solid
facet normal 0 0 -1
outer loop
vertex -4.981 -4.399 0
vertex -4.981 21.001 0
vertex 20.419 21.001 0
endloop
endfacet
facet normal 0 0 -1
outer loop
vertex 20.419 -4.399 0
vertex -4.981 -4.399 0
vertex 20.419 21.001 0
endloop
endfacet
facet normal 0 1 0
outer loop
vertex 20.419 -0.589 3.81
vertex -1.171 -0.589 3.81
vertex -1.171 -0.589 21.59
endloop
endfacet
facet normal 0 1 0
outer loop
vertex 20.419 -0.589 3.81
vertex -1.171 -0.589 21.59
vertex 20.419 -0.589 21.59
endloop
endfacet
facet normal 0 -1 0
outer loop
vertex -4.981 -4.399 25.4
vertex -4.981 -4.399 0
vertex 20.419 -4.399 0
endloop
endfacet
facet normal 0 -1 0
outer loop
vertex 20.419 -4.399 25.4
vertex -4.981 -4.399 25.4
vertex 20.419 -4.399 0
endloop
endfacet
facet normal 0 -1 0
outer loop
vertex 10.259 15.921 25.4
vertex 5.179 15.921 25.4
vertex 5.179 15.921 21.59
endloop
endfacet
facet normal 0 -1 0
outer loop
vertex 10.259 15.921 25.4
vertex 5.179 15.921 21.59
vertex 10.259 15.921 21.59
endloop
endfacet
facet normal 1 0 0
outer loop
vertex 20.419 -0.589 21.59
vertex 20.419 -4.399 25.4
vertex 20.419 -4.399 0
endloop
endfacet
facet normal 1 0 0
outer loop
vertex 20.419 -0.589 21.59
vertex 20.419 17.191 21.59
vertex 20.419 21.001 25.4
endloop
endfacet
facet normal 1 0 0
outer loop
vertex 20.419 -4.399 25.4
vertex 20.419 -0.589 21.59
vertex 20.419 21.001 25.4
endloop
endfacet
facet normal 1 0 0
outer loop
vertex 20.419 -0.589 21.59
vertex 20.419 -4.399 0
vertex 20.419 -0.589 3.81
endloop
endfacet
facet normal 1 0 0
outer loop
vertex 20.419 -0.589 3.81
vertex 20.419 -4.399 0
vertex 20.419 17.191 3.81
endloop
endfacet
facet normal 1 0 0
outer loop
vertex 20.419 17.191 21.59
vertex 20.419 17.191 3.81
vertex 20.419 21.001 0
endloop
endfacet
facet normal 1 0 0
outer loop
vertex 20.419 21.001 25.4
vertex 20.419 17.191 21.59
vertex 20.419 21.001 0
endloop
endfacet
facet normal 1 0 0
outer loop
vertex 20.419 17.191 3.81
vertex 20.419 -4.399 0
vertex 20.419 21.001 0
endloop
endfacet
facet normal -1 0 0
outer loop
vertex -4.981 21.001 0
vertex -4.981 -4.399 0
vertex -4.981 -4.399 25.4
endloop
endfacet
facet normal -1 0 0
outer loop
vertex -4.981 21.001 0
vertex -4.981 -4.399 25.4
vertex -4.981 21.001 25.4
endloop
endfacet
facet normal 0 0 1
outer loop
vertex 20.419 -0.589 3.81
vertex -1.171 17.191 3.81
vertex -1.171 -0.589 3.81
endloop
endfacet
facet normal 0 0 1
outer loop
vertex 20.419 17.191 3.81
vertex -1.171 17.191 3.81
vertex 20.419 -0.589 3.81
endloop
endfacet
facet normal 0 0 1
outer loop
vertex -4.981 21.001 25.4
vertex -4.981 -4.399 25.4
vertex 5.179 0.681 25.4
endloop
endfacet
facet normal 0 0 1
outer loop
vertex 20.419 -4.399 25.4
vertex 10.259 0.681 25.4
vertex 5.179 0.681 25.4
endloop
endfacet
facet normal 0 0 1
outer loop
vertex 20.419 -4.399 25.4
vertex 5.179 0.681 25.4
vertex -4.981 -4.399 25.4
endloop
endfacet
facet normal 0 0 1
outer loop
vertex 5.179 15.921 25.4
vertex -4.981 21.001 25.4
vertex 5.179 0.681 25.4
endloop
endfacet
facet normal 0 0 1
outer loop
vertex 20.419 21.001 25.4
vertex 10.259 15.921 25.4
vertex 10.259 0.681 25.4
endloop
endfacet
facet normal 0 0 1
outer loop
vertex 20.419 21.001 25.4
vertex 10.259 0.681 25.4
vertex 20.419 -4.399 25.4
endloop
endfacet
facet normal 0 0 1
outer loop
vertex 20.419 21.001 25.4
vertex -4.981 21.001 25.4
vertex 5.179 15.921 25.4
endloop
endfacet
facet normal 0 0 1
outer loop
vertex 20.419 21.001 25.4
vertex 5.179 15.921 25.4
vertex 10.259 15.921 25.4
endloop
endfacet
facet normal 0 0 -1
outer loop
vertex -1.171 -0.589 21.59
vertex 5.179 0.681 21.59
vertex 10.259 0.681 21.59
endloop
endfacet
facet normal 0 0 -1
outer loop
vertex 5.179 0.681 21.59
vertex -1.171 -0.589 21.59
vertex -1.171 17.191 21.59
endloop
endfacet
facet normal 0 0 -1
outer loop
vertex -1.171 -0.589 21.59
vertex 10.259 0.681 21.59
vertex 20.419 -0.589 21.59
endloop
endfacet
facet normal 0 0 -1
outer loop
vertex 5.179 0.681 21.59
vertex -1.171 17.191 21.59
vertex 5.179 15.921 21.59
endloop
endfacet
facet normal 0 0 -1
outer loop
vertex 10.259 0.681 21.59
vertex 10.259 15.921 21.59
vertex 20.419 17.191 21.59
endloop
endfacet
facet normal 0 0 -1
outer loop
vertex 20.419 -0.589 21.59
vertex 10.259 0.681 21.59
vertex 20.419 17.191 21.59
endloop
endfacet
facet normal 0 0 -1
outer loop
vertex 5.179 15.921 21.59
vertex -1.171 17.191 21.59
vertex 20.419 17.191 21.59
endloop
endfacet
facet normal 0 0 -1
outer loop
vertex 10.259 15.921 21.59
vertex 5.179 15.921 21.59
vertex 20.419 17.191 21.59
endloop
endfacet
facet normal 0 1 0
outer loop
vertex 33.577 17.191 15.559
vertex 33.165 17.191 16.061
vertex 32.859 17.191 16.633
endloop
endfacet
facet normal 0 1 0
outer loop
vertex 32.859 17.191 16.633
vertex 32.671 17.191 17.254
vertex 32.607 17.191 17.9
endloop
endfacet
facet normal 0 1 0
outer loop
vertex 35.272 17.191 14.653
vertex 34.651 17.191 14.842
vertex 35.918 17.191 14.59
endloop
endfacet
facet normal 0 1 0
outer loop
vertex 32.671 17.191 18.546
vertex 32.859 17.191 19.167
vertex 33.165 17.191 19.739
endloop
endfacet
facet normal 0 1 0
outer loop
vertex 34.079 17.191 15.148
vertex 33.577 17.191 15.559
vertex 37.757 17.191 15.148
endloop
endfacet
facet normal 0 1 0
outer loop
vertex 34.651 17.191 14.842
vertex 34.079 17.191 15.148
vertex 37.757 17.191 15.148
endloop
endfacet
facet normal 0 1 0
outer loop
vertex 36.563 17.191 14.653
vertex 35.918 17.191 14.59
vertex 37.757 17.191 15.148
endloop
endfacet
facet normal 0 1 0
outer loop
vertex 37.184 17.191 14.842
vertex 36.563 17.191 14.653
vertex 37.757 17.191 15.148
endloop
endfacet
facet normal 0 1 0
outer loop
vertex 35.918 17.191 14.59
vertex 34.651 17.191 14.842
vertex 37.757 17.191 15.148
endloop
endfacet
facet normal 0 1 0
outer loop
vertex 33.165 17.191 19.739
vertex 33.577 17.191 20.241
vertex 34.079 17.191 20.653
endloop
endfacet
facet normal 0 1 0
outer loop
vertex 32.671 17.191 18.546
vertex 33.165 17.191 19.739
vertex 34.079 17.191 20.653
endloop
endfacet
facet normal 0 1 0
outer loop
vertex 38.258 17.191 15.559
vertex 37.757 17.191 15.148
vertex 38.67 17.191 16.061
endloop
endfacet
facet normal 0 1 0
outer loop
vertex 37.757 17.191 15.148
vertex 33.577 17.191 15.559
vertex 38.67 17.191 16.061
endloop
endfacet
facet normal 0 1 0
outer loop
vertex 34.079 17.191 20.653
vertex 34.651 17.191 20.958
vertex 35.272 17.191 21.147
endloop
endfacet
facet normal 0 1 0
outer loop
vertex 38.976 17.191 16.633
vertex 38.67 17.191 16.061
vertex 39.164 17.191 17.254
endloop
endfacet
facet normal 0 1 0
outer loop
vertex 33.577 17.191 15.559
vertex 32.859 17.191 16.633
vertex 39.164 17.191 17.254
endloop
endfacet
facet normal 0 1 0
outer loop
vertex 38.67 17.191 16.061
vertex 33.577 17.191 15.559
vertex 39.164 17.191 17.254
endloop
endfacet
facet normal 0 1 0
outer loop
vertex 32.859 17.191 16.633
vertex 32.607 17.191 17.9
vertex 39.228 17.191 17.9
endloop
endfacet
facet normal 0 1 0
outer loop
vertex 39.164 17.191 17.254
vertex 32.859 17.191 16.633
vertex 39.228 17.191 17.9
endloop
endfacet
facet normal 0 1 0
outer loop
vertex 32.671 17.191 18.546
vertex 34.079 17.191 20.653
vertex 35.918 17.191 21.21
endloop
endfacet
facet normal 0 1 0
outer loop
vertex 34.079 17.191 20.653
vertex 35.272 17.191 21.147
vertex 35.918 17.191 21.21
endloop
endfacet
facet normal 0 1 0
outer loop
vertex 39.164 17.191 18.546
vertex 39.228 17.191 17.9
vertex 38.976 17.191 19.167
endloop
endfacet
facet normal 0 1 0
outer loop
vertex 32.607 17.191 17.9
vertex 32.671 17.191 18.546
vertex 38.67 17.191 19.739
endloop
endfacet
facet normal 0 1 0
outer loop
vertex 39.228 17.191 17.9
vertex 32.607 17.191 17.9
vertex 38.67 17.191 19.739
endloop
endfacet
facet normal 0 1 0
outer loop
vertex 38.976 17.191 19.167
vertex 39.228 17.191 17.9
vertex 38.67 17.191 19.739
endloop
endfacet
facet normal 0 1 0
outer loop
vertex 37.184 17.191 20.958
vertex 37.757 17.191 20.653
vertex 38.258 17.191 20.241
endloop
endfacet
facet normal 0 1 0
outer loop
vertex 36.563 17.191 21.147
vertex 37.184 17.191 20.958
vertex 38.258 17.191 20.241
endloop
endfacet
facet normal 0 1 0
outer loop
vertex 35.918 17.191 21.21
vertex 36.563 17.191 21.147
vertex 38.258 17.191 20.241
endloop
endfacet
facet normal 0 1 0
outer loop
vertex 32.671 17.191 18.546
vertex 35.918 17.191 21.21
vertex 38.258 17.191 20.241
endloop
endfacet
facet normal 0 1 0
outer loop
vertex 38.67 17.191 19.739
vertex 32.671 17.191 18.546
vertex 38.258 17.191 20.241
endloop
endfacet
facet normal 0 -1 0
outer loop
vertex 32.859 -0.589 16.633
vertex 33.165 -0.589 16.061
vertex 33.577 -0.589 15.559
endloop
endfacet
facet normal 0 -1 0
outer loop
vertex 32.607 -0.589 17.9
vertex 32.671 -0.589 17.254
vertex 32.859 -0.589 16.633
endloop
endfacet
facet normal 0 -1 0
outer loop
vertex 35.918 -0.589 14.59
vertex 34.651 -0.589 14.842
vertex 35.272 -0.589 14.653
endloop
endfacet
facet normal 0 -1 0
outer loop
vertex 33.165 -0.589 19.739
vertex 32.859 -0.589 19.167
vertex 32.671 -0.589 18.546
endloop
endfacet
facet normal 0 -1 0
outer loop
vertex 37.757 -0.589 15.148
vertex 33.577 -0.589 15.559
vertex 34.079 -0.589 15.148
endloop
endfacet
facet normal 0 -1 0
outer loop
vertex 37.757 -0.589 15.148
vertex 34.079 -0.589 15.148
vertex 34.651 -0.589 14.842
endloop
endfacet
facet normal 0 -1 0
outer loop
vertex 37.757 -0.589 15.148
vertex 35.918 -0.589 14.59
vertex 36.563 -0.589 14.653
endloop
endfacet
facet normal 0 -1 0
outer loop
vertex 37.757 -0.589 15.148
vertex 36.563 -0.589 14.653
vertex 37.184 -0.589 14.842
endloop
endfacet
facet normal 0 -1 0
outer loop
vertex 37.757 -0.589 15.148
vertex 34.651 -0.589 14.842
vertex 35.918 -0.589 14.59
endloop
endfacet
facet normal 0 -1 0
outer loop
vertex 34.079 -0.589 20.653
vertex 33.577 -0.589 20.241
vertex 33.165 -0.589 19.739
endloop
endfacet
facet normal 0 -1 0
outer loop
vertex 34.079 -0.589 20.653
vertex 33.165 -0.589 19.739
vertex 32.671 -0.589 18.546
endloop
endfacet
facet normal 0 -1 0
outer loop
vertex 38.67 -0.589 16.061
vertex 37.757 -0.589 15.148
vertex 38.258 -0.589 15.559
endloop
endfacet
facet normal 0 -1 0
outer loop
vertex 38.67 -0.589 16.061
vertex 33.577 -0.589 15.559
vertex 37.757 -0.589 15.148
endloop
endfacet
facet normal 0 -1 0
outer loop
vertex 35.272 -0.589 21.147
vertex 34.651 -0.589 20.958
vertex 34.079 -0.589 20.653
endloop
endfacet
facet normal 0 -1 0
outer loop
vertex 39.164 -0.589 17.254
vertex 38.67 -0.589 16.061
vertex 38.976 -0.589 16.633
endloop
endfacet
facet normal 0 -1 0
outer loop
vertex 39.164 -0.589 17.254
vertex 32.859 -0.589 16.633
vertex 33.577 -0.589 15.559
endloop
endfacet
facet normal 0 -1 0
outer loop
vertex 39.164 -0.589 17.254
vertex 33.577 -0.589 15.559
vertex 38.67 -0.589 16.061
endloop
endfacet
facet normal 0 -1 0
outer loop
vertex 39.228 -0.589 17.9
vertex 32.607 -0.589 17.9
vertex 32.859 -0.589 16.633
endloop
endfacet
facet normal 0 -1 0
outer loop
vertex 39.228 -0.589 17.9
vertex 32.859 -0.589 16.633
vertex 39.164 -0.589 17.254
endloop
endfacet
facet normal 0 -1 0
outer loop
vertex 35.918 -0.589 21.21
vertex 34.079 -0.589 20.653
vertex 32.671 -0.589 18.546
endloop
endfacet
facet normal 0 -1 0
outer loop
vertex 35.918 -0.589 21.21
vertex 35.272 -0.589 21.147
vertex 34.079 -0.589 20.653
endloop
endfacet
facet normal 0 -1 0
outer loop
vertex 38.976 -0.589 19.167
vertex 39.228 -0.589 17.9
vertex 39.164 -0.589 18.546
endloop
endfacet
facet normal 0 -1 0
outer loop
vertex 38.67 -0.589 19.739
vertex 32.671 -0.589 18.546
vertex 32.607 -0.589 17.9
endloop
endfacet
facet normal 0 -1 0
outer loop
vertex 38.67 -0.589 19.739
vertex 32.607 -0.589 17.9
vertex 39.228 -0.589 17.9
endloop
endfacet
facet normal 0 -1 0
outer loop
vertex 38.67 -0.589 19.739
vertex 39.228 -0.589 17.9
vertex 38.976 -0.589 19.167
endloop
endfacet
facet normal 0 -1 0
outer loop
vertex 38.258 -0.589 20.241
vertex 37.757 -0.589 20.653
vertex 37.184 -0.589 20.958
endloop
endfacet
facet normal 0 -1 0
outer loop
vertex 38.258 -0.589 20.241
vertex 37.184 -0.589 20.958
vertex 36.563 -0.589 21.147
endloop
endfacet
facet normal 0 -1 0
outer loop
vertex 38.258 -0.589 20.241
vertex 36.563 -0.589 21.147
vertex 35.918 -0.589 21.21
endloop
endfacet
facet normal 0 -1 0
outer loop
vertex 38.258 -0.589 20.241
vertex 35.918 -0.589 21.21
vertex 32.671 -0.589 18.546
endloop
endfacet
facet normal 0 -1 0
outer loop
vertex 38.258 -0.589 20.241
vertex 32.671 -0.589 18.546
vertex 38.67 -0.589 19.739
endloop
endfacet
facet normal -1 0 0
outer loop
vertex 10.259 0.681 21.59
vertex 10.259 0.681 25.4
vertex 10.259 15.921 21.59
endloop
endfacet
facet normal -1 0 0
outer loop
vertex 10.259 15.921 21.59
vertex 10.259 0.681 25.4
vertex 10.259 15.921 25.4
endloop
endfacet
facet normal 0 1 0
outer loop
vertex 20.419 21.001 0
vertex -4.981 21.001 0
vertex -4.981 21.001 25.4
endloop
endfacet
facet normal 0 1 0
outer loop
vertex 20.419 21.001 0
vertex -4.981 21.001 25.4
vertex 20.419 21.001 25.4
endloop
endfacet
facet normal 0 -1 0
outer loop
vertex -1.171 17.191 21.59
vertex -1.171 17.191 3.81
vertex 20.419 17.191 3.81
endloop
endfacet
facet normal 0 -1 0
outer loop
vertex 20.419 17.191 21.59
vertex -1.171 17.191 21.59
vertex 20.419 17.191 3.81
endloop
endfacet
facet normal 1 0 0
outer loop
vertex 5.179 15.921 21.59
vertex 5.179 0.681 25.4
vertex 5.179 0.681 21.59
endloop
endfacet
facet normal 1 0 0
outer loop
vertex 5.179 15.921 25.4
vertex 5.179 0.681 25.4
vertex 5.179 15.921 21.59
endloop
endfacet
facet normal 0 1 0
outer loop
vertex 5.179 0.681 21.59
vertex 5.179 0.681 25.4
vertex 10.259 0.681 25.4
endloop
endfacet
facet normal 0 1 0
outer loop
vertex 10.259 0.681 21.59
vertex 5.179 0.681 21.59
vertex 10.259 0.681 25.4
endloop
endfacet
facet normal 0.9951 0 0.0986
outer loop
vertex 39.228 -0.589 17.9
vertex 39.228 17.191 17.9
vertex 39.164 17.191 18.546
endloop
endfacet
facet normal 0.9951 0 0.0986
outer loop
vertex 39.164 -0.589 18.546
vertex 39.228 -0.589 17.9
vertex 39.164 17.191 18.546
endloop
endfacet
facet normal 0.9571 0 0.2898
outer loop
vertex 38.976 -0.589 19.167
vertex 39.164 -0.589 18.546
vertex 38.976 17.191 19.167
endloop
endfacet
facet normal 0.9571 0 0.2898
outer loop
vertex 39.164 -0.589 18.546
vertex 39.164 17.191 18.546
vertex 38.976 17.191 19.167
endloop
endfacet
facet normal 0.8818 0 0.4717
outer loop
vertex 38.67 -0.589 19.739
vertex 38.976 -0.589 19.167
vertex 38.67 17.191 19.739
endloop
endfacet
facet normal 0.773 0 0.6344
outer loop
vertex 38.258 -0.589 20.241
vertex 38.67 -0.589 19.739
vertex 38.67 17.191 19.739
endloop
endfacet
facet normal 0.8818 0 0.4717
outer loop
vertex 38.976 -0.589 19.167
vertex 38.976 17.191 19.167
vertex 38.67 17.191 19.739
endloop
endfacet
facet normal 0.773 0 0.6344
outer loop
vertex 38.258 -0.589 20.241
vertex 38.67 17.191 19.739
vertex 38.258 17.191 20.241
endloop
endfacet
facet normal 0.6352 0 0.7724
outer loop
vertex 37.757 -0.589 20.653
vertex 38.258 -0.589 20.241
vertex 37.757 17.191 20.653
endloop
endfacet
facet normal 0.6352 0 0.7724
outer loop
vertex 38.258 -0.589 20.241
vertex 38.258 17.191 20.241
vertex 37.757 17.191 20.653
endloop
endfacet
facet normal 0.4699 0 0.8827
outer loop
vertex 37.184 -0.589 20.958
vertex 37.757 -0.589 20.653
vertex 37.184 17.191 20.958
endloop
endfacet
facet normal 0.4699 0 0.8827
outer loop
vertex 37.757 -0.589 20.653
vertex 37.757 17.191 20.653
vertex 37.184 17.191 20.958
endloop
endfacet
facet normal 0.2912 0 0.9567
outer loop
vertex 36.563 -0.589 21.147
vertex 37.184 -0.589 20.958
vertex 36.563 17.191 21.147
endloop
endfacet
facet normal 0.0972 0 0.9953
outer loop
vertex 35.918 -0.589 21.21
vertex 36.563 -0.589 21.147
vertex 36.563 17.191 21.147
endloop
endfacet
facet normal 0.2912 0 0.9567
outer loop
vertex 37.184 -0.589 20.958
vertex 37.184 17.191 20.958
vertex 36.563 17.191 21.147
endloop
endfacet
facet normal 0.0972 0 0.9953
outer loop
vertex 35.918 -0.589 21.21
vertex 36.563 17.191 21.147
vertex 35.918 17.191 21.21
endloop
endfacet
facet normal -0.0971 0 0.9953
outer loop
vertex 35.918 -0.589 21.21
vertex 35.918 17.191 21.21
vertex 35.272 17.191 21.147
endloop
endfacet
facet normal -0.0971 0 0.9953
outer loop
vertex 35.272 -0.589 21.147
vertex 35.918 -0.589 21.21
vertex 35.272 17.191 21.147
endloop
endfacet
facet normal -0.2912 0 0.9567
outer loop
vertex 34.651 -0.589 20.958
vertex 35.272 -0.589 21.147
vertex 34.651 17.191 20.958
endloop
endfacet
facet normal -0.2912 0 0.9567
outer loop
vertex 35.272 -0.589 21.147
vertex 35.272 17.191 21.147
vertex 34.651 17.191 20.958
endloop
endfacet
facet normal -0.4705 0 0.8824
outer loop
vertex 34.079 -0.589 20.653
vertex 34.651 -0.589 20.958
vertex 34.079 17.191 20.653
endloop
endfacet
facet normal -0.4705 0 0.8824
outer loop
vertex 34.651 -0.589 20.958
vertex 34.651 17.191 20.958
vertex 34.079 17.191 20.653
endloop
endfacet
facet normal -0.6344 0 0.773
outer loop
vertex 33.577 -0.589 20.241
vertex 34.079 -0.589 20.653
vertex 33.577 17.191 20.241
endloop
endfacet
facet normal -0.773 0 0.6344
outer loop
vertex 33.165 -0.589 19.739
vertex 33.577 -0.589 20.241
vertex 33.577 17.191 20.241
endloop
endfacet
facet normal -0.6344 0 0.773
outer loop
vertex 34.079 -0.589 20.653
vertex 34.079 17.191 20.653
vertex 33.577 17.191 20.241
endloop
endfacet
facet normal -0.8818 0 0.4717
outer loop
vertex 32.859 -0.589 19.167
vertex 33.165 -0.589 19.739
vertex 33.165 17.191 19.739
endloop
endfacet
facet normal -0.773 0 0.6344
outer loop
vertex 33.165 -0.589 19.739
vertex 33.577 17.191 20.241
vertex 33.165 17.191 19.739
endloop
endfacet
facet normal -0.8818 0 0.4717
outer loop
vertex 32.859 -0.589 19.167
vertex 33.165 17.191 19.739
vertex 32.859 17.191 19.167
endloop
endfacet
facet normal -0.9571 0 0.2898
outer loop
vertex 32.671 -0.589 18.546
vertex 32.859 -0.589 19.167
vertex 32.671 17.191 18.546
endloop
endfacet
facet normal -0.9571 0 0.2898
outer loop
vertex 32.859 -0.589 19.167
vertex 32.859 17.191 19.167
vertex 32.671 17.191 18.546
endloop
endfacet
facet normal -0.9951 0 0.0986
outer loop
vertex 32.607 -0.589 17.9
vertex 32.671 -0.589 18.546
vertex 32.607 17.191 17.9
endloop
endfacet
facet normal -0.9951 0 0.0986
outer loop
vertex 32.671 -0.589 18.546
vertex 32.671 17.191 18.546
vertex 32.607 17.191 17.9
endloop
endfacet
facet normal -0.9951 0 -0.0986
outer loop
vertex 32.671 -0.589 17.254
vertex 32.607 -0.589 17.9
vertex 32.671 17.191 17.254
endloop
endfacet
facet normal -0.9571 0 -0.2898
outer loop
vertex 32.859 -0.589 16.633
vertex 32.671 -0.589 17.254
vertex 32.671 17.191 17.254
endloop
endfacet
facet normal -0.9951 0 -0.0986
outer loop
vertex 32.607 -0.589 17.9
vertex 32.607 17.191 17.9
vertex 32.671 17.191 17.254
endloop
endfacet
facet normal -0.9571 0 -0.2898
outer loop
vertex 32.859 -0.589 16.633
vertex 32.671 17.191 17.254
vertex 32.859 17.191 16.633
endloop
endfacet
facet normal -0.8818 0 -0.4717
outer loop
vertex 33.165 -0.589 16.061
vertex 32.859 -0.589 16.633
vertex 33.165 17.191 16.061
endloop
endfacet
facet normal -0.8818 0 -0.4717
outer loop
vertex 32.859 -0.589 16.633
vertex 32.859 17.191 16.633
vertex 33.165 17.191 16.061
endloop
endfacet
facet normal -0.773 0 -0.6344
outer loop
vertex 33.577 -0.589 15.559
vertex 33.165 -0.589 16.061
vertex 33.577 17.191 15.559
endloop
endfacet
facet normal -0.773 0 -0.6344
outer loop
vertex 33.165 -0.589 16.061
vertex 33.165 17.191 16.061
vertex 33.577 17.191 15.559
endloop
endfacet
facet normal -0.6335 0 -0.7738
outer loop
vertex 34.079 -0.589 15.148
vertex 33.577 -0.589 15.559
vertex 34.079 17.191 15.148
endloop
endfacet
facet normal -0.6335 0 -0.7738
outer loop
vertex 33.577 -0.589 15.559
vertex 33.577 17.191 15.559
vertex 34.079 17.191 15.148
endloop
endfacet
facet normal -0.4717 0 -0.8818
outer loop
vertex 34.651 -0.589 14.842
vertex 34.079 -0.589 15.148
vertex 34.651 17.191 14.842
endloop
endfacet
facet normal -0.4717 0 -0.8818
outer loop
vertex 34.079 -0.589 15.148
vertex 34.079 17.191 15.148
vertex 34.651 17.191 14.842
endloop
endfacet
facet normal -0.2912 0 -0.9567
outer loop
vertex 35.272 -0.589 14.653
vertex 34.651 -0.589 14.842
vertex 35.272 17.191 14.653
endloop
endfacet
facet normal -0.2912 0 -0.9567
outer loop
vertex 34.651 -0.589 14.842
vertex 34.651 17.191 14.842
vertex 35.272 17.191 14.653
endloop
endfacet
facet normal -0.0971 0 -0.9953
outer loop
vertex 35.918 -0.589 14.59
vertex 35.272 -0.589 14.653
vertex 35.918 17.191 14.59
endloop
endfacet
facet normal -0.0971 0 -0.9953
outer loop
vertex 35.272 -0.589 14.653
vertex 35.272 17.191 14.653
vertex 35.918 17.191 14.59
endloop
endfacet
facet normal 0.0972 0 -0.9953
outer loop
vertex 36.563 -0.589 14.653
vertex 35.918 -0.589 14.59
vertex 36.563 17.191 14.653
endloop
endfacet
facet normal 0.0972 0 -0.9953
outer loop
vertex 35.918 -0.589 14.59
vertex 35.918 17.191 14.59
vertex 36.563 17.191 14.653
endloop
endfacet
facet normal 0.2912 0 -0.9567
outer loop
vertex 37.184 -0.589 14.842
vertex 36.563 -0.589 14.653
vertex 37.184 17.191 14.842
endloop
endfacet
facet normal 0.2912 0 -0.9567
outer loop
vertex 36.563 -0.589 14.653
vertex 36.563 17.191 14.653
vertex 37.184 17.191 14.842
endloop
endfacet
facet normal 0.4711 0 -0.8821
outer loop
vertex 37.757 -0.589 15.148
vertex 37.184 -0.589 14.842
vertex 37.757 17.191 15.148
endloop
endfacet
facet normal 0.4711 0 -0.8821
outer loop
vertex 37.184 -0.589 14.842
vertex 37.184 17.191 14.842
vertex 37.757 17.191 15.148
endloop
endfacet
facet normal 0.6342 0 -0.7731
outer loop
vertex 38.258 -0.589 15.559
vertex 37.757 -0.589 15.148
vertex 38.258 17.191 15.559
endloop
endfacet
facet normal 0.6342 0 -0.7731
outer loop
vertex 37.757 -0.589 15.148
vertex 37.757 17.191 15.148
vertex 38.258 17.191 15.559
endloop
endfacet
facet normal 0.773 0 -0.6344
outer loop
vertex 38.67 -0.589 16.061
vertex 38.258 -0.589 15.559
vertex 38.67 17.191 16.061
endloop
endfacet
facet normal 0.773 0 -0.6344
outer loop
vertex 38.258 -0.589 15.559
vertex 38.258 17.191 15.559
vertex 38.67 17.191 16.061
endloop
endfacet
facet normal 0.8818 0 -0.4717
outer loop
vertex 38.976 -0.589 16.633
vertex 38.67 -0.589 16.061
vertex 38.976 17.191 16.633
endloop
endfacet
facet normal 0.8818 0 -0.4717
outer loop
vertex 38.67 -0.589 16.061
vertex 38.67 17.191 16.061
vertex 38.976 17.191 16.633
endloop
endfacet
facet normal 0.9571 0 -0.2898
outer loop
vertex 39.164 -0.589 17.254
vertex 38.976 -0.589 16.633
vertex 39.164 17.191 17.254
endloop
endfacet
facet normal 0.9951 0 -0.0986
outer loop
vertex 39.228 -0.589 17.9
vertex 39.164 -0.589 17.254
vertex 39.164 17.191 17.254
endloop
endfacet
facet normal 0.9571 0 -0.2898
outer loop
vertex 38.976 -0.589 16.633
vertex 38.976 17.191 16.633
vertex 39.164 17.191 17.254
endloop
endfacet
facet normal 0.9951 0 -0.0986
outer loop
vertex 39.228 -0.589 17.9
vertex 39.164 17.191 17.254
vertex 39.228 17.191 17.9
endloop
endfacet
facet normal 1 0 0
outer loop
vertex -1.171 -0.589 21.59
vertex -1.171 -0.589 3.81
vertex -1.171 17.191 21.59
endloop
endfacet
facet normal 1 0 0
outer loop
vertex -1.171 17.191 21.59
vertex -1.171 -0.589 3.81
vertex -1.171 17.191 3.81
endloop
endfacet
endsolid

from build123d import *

# Parameters (mm, degrees)
F0_W     = 25.4
F0_H     = 25.4
F1_DEPTH = 25.4
F3_T     = -3.81
F2_W     = 5.08
F2_H     = 15.24
F4_DEPTH = 3.81
F5_R     = 3.310311
F6_DEPTH = 17.78


with BuildPart() as f1:
    # F0 (on Top) → F1 (new body)
    with BuildSketch(Plane.XY):
        with Locations((7.719, 8.301484)):
            Rectangle(F0_W, F0_H)
    extrude(amount=F1_DEPTH)

    # F3
    f3_openings = [f1.faces().sort_by_distance(p)[0] for p in [
        (20.419, 8.301484, 12.7),
    ]]
    offset(amount=F3_T, openings=f3_openings)

    # F2 (on face) → F4 (cut)
    with BuildSketch(Plane.XY.offset(25.4)):
        with Locations((7.719, 8.301484)):
            Rectangle(F2_W, F2_H)
    extrude(amount=-F4_DEPTH, mode=Mode.SUBTRACT)


with BuildPart() as f6:
    # F5 (on face) → F6 (new body)
    with BuildSketch(Plane.XZ.offset(-17.191484)):
        with Locations((35.917625, 17.900087)):
            Circle(F5_R)
    extrude(amount=F6_DEPTH)


solid = Compound([f1.part, f6.part])
